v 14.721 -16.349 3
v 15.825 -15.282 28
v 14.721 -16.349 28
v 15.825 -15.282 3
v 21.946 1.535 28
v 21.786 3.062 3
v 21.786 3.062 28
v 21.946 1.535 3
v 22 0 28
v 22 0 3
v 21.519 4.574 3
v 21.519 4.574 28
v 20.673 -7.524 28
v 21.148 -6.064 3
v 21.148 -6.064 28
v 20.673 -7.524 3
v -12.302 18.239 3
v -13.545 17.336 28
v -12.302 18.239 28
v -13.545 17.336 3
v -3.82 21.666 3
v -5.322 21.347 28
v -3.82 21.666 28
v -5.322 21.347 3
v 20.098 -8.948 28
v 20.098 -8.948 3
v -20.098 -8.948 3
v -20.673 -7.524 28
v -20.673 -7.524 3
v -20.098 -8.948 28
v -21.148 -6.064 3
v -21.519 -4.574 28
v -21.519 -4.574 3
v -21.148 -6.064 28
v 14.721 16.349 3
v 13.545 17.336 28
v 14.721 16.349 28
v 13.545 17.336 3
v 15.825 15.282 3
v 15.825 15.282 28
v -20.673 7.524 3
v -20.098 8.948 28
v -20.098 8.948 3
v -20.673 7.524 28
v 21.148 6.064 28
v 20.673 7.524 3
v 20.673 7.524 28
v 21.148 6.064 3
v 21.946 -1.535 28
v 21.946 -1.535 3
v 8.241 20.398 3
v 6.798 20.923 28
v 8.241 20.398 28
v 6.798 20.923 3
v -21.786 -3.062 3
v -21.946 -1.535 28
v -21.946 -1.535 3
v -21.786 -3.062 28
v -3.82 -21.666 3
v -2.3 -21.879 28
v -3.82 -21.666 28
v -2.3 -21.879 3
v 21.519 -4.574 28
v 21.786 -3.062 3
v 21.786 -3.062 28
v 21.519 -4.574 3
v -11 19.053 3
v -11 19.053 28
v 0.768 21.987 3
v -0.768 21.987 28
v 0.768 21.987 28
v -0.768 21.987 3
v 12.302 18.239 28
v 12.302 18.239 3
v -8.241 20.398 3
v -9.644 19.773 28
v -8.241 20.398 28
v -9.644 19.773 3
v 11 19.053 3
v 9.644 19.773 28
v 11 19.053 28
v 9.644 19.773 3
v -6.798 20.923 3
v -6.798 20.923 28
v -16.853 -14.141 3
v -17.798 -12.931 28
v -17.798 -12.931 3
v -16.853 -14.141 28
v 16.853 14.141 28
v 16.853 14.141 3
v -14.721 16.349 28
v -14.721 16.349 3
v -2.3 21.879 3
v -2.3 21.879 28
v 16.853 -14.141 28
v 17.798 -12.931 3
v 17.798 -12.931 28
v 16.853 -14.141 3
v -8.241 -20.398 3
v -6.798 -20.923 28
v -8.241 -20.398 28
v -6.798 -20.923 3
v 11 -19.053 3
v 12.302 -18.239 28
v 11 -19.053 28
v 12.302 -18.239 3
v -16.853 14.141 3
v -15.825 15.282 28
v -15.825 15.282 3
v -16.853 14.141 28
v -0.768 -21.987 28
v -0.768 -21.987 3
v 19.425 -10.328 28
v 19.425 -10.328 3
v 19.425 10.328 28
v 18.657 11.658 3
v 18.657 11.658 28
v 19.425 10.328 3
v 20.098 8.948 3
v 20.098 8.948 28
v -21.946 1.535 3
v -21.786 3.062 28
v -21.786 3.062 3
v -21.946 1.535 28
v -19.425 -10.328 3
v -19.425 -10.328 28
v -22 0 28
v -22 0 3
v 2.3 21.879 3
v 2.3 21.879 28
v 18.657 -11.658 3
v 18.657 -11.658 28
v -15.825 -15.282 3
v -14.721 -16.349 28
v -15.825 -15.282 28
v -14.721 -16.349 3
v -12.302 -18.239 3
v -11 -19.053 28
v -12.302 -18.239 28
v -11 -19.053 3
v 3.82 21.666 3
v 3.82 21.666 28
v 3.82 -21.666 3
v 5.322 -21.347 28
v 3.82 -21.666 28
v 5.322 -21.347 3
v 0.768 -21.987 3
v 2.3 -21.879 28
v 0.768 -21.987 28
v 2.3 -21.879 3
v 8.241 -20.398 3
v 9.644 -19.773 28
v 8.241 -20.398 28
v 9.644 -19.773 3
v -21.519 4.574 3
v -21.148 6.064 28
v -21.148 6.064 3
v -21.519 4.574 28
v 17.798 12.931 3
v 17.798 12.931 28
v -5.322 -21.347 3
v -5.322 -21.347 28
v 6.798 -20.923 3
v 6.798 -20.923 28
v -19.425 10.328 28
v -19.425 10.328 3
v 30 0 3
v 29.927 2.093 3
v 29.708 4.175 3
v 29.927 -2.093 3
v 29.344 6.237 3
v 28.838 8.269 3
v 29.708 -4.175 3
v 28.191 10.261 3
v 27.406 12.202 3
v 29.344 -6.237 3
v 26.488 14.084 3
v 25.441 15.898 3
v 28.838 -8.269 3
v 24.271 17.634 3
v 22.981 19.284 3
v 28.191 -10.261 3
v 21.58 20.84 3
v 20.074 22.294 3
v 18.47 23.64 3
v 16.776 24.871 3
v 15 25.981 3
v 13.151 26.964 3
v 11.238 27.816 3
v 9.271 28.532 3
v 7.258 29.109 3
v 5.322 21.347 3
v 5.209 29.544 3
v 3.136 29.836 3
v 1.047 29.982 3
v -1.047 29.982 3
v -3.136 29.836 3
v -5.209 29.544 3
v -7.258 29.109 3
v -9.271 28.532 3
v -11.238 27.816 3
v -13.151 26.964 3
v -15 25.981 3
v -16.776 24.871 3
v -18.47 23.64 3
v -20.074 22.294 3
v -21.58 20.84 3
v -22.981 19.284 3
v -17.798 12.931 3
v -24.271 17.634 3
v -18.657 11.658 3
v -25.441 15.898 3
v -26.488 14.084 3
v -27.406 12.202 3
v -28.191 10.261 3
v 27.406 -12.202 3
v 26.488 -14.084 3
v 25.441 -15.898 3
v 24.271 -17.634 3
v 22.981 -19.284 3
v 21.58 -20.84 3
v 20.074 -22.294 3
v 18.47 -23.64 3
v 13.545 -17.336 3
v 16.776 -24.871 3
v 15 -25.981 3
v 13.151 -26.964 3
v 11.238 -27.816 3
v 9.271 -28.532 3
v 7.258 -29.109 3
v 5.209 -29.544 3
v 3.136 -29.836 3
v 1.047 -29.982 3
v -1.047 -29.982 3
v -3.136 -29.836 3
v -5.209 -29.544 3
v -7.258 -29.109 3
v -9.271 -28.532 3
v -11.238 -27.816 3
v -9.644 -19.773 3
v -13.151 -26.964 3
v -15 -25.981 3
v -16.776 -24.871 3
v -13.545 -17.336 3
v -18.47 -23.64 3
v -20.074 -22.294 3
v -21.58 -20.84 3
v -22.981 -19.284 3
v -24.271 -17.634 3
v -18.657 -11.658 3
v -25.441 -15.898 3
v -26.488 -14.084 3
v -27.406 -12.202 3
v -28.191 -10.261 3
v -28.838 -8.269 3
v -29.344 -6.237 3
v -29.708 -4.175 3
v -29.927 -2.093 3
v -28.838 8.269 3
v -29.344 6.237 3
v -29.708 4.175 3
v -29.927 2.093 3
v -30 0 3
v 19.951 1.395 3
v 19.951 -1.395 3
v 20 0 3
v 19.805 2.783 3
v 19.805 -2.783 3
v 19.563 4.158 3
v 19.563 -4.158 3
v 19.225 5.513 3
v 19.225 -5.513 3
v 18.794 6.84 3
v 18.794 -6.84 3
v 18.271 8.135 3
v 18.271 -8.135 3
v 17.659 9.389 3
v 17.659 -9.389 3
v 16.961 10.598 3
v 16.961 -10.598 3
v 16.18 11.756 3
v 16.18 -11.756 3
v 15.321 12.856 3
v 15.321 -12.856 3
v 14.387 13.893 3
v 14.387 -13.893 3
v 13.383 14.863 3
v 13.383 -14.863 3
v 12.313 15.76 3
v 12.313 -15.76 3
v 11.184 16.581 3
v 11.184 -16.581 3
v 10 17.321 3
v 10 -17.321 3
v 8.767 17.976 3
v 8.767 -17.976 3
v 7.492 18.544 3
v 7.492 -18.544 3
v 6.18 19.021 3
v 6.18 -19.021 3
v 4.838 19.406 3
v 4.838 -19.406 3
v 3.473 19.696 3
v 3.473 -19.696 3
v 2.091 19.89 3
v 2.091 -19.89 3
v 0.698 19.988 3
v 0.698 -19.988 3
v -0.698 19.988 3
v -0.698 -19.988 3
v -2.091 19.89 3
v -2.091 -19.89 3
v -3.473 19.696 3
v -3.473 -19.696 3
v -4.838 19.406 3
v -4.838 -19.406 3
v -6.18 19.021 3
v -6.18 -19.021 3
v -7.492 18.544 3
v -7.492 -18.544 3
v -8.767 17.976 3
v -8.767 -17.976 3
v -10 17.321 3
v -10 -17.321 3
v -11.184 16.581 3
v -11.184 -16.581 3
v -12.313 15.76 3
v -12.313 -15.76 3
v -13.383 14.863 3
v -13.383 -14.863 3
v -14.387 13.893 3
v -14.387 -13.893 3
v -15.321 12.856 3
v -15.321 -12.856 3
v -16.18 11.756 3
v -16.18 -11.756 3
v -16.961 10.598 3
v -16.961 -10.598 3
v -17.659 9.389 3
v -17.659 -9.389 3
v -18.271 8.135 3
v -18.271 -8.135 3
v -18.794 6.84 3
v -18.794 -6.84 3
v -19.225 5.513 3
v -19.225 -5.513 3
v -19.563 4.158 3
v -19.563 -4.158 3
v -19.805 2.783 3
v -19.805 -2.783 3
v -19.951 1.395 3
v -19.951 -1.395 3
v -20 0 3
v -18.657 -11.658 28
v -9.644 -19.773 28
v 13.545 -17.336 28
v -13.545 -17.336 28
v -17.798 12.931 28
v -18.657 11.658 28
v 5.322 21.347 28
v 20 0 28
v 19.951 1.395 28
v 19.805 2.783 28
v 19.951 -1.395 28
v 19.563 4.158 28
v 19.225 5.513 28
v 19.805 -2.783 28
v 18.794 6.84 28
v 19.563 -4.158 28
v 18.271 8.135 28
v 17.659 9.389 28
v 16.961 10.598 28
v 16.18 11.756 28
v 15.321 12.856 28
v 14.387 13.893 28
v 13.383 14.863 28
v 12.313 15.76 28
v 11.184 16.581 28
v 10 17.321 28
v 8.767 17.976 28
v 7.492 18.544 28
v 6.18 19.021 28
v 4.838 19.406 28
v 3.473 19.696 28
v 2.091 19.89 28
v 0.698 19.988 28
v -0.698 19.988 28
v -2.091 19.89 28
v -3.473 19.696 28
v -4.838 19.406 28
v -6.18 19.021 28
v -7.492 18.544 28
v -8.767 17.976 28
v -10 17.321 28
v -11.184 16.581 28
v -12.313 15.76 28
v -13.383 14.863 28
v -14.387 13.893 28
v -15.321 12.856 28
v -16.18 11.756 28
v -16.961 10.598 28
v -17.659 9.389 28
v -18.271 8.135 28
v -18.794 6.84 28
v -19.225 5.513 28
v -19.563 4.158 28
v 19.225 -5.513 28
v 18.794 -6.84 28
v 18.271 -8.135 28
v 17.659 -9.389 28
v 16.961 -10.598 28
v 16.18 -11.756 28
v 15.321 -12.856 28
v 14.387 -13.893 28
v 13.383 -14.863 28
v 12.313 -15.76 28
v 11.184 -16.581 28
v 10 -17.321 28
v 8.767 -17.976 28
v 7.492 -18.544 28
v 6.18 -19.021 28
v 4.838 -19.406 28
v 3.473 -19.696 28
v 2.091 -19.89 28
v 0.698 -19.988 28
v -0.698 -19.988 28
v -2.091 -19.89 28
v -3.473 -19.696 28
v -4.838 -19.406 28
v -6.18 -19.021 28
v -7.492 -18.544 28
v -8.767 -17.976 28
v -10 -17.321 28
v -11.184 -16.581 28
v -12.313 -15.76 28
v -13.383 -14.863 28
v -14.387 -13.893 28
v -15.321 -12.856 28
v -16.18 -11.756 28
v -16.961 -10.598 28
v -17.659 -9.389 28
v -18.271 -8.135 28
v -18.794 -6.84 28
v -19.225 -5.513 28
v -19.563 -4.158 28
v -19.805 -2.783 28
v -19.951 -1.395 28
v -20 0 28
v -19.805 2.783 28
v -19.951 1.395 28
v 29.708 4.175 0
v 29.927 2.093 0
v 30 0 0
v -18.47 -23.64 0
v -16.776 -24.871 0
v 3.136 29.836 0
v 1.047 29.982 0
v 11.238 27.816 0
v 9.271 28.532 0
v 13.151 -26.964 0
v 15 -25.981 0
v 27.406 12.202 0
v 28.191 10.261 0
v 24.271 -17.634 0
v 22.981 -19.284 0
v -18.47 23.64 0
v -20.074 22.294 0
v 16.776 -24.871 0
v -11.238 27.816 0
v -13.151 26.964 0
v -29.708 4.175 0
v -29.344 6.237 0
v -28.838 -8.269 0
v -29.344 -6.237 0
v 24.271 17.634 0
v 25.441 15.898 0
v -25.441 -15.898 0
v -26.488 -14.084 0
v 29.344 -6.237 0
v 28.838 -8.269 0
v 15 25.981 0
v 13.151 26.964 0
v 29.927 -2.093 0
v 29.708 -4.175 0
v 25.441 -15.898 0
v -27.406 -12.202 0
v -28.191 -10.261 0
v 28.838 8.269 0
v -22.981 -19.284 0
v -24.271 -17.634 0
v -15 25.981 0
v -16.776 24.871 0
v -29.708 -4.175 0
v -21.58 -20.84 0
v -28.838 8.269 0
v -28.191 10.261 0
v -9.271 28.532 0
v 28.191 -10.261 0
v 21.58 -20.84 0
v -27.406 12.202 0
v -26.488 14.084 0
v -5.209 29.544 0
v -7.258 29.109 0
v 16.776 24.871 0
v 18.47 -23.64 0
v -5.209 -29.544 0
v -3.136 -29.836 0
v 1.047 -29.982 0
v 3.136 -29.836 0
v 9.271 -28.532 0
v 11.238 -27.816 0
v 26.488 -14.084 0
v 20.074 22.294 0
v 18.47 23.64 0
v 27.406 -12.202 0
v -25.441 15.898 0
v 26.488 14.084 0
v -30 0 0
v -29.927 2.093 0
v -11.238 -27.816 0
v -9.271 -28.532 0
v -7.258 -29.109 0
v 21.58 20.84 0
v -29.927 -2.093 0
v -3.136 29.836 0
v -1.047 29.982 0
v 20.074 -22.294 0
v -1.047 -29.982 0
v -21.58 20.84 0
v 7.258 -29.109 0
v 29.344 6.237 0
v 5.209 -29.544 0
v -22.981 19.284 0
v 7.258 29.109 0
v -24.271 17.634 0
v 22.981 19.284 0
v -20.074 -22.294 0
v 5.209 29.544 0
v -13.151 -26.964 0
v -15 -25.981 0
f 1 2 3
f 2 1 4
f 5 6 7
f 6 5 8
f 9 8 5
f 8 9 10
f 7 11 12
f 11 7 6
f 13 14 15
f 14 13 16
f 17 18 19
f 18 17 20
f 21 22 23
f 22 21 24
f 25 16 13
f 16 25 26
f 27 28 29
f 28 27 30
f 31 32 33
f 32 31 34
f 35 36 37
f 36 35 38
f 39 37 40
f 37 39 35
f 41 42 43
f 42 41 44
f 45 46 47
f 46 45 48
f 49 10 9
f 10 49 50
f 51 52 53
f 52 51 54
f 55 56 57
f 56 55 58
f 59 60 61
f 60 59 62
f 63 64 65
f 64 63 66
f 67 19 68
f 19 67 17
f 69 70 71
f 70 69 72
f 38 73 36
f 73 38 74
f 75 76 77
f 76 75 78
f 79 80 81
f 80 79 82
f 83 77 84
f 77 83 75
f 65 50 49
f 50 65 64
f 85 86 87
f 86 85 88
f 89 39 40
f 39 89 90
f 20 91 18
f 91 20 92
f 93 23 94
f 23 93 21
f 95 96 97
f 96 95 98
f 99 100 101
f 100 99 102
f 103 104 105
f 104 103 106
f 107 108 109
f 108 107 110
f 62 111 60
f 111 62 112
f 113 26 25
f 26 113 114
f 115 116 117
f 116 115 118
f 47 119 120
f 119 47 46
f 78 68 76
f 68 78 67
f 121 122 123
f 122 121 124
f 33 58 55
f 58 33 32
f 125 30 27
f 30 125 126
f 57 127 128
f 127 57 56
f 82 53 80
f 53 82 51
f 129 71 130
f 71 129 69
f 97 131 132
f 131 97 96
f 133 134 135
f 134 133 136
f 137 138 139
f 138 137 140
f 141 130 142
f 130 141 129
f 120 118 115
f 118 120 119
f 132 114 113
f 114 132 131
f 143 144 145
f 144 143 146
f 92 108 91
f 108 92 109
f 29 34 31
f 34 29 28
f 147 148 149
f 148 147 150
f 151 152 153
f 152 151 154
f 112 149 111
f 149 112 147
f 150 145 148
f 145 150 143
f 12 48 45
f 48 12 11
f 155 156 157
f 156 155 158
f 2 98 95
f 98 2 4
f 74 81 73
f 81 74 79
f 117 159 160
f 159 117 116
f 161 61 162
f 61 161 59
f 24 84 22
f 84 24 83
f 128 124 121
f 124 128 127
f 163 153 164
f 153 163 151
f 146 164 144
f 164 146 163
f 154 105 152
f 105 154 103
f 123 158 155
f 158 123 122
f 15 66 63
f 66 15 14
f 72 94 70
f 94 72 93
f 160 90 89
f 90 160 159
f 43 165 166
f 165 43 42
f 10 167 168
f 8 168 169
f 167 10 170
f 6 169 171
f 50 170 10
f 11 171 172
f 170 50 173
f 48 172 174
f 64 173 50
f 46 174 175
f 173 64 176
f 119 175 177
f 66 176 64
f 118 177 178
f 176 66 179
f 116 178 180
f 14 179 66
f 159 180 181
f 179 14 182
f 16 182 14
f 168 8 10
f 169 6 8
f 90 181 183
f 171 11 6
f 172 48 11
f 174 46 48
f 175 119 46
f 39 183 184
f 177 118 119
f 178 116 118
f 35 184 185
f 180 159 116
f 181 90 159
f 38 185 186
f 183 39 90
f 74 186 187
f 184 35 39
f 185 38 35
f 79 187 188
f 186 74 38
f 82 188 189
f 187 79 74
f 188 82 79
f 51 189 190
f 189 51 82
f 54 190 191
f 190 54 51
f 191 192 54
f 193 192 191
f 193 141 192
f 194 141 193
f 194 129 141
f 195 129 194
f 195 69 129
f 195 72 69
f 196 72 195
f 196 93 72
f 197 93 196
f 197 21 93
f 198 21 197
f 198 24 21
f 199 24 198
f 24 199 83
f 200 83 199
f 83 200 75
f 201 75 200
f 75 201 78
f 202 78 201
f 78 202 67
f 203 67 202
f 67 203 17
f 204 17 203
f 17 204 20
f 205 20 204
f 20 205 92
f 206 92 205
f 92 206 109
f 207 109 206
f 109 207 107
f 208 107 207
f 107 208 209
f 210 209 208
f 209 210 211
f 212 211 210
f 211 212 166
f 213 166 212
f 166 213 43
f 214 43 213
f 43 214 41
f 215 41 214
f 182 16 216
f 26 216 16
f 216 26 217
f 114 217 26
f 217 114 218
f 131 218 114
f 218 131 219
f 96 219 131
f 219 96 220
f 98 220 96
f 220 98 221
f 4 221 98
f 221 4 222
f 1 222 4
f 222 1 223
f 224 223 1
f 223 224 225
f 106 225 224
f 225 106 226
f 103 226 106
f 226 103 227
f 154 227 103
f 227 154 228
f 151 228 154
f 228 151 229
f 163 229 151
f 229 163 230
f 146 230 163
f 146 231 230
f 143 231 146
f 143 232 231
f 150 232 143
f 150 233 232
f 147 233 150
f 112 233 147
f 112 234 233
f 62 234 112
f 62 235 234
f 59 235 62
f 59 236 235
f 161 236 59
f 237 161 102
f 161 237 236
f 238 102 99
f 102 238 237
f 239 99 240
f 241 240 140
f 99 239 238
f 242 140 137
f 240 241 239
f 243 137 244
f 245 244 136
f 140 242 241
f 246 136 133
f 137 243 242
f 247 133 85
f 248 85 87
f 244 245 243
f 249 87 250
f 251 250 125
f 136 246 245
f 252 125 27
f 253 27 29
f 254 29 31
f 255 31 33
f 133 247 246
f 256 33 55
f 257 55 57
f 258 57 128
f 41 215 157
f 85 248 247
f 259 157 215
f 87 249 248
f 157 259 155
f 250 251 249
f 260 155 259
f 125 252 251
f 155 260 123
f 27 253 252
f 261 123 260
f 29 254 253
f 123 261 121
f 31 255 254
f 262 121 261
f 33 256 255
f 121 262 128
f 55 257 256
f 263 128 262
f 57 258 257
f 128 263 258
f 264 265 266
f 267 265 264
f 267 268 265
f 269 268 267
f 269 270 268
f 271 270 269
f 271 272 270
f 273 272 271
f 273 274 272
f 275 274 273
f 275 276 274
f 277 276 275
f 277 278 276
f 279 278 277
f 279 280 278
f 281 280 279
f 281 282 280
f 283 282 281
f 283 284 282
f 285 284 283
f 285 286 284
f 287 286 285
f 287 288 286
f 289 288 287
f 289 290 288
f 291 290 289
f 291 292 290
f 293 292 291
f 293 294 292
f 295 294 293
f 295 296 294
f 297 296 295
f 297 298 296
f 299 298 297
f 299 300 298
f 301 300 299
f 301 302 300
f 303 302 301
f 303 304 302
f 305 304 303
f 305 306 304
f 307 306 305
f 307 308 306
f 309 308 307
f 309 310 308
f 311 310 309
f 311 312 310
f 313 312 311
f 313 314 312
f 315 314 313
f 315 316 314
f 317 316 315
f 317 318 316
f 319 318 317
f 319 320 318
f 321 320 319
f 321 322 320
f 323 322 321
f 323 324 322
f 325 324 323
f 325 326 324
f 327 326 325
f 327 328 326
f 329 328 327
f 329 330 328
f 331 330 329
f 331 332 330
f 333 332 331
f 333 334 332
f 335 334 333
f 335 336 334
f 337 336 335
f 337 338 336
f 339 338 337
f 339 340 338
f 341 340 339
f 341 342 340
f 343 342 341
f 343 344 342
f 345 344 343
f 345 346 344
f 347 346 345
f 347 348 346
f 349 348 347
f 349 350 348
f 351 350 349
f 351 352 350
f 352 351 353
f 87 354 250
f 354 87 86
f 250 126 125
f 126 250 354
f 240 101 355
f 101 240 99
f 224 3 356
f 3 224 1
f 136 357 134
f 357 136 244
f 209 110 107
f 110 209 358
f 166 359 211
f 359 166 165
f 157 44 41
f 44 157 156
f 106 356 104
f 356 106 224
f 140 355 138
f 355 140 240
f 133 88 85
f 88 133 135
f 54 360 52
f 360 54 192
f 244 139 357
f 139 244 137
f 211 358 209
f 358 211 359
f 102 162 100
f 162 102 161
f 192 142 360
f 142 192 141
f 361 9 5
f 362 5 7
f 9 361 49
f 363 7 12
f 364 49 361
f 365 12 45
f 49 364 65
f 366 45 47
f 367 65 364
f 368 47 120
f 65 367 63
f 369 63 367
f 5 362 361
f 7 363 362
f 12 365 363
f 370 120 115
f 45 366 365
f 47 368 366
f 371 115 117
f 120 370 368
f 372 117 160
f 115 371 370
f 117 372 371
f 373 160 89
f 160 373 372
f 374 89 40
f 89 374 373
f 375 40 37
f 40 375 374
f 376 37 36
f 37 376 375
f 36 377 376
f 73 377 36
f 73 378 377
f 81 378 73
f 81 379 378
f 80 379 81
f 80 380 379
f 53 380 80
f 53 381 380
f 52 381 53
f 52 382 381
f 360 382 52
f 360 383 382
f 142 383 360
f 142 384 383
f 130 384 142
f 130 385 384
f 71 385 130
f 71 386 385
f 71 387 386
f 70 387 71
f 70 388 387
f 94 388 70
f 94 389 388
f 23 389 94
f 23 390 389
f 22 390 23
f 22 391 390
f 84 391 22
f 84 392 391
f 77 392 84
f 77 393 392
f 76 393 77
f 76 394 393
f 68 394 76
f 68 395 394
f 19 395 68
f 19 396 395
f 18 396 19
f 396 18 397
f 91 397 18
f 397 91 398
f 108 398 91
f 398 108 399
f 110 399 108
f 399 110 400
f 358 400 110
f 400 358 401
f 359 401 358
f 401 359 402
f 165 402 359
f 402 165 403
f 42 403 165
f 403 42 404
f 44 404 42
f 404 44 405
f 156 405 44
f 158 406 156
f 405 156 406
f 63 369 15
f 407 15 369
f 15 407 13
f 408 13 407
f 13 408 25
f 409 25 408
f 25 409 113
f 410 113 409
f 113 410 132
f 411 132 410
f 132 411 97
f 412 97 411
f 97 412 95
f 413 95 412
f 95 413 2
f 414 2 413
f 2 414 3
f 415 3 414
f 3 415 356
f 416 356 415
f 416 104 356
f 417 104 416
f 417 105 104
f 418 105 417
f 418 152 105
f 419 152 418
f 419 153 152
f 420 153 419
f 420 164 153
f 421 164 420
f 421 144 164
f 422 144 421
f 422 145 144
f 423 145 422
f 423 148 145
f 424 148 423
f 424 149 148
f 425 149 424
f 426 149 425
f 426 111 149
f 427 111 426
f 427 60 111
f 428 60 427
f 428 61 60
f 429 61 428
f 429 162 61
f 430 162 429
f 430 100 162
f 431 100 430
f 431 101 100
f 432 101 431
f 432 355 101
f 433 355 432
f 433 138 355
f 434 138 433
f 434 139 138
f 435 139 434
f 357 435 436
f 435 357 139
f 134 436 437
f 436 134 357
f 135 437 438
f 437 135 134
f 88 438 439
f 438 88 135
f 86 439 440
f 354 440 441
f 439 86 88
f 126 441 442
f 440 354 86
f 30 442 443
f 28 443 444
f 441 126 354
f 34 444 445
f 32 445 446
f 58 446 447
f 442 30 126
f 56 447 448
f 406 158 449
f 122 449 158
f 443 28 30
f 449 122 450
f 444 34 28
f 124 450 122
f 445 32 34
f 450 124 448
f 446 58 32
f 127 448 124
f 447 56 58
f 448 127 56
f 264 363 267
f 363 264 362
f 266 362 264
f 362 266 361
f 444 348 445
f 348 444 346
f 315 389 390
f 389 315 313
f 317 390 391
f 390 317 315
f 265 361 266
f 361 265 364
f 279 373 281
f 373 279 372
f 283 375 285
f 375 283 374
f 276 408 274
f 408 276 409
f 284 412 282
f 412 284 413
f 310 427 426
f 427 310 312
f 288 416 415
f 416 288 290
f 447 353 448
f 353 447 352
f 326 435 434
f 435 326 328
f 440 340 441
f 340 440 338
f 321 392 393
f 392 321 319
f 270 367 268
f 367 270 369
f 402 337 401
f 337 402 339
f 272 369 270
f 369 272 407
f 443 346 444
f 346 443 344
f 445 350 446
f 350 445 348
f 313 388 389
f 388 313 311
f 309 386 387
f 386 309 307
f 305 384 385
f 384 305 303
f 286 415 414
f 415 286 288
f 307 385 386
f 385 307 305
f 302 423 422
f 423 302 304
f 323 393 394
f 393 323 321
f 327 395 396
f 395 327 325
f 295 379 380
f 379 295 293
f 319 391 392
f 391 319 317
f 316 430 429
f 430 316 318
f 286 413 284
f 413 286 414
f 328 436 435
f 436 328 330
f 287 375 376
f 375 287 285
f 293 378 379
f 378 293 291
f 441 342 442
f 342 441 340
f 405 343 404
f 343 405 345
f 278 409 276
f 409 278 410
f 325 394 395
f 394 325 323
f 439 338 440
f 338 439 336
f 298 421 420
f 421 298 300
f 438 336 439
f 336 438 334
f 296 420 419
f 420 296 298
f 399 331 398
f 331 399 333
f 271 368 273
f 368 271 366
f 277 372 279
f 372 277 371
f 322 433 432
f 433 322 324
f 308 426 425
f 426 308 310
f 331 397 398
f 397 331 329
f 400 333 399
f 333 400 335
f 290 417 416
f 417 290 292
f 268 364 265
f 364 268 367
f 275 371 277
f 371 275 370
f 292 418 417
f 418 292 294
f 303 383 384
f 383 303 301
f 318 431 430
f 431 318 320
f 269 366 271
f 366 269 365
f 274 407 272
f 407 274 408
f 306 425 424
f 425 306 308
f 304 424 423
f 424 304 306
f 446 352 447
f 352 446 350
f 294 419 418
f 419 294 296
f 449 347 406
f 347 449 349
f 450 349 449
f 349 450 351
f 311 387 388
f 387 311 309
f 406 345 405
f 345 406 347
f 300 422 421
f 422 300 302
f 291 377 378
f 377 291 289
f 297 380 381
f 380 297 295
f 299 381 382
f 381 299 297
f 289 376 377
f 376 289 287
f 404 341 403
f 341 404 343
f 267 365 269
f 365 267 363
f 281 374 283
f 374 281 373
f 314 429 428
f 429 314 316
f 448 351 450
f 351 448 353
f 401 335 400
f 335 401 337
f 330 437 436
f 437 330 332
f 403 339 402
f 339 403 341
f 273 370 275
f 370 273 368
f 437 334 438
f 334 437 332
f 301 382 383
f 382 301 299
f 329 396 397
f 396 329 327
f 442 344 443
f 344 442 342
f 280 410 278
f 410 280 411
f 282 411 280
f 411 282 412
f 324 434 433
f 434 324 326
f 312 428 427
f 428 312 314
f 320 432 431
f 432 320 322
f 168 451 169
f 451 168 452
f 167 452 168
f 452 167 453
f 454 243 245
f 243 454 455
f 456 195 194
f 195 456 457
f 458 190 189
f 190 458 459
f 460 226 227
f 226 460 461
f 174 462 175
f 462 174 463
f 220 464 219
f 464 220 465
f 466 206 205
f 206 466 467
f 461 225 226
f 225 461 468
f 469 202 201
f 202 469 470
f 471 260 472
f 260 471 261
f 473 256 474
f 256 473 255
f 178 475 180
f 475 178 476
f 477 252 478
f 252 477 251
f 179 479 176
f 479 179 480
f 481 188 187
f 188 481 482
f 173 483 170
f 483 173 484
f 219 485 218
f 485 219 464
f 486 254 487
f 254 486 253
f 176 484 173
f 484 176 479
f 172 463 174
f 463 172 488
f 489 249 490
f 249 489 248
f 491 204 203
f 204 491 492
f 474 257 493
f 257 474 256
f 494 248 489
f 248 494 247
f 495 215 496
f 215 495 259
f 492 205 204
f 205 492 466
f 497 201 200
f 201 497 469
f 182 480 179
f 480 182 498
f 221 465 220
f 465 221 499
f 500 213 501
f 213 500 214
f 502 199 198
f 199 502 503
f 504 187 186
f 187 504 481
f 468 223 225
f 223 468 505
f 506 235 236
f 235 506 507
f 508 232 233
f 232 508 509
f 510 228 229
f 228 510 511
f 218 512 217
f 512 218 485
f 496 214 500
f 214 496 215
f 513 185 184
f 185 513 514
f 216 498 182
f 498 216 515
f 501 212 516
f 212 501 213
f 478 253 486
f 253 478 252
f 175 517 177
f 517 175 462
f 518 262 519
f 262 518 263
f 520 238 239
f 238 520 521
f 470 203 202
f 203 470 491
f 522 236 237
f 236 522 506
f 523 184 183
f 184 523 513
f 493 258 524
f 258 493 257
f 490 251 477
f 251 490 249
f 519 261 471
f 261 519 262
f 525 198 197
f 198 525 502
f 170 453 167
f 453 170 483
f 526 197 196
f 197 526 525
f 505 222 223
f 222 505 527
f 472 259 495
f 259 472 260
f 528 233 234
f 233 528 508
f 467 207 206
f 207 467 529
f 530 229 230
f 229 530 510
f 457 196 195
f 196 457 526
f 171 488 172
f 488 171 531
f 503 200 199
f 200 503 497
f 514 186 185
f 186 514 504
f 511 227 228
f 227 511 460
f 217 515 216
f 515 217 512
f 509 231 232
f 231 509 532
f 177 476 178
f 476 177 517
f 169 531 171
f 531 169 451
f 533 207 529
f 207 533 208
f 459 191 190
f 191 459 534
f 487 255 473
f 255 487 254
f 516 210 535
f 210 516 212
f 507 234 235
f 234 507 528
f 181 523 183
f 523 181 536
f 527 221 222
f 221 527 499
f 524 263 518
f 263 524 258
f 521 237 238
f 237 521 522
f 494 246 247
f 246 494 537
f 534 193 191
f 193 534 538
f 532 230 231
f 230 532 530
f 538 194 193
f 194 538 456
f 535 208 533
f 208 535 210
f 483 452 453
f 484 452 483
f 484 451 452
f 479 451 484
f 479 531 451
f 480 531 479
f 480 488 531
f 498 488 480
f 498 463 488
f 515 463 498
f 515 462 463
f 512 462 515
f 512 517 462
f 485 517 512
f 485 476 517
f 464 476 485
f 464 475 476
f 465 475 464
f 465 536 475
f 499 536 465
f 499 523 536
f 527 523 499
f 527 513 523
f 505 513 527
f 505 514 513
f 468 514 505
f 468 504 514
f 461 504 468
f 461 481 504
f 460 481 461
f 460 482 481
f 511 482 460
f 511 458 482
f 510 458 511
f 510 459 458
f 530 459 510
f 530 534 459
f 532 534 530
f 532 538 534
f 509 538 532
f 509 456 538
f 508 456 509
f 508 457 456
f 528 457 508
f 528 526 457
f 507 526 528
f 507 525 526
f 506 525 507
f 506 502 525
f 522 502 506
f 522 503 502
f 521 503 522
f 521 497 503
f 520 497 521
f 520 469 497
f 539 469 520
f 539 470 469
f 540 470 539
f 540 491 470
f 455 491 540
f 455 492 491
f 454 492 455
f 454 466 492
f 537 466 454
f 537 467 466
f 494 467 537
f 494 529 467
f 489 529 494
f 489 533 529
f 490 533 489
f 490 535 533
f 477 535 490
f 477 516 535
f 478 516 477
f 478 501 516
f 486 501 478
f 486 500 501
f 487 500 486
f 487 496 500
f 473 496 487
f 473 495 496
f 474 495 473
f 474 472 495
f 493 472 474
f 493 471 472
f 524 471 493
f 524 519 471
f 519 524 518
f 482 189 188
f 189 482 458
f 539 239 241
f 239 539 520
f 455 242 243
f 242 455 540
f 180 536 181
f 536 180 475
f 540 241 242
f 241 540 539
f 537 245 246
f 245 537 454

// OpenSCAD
//Simple Plug or Cap

//How thick do you want the solid end portion in mm?
End_Thickness = 3;

//Diameter of the solid end portion in mm (set equal to Tube Outer Diameter for a smooth cap).
End_Diameter = 60;

//Hole diameter in mm (this dimension is critical for a cap).
Tube_Inner_Diameter = 40;

//Outer diameter of the tube portion in mm (this dimension is critical for a plug).
Tube_Outer_Diameter = 44;

//Length of the tube portion in mm (Overall Height = this dimension + End Thickness).
Tube_Height = 25; 

/* [Hidden] */
res = 90;

module plug ()
{
	union()
	{
	cylinder(h = End_Thickness, r = End_Diameter/2, center = false, $fn = res);
	
		difference()
		{
		translate ([0,0,End_Thickness]) cylinder(h = Tube_Height, r = Tube_Outer_Diameter/2, center = false, $fn = res);
		translate ([0,0,End_Thickness]) cylinder(h = Tube_Height+1, r = Tube_Inner_Diameter/2, center = false, $fn = res);
		}
	}
}
plug();
